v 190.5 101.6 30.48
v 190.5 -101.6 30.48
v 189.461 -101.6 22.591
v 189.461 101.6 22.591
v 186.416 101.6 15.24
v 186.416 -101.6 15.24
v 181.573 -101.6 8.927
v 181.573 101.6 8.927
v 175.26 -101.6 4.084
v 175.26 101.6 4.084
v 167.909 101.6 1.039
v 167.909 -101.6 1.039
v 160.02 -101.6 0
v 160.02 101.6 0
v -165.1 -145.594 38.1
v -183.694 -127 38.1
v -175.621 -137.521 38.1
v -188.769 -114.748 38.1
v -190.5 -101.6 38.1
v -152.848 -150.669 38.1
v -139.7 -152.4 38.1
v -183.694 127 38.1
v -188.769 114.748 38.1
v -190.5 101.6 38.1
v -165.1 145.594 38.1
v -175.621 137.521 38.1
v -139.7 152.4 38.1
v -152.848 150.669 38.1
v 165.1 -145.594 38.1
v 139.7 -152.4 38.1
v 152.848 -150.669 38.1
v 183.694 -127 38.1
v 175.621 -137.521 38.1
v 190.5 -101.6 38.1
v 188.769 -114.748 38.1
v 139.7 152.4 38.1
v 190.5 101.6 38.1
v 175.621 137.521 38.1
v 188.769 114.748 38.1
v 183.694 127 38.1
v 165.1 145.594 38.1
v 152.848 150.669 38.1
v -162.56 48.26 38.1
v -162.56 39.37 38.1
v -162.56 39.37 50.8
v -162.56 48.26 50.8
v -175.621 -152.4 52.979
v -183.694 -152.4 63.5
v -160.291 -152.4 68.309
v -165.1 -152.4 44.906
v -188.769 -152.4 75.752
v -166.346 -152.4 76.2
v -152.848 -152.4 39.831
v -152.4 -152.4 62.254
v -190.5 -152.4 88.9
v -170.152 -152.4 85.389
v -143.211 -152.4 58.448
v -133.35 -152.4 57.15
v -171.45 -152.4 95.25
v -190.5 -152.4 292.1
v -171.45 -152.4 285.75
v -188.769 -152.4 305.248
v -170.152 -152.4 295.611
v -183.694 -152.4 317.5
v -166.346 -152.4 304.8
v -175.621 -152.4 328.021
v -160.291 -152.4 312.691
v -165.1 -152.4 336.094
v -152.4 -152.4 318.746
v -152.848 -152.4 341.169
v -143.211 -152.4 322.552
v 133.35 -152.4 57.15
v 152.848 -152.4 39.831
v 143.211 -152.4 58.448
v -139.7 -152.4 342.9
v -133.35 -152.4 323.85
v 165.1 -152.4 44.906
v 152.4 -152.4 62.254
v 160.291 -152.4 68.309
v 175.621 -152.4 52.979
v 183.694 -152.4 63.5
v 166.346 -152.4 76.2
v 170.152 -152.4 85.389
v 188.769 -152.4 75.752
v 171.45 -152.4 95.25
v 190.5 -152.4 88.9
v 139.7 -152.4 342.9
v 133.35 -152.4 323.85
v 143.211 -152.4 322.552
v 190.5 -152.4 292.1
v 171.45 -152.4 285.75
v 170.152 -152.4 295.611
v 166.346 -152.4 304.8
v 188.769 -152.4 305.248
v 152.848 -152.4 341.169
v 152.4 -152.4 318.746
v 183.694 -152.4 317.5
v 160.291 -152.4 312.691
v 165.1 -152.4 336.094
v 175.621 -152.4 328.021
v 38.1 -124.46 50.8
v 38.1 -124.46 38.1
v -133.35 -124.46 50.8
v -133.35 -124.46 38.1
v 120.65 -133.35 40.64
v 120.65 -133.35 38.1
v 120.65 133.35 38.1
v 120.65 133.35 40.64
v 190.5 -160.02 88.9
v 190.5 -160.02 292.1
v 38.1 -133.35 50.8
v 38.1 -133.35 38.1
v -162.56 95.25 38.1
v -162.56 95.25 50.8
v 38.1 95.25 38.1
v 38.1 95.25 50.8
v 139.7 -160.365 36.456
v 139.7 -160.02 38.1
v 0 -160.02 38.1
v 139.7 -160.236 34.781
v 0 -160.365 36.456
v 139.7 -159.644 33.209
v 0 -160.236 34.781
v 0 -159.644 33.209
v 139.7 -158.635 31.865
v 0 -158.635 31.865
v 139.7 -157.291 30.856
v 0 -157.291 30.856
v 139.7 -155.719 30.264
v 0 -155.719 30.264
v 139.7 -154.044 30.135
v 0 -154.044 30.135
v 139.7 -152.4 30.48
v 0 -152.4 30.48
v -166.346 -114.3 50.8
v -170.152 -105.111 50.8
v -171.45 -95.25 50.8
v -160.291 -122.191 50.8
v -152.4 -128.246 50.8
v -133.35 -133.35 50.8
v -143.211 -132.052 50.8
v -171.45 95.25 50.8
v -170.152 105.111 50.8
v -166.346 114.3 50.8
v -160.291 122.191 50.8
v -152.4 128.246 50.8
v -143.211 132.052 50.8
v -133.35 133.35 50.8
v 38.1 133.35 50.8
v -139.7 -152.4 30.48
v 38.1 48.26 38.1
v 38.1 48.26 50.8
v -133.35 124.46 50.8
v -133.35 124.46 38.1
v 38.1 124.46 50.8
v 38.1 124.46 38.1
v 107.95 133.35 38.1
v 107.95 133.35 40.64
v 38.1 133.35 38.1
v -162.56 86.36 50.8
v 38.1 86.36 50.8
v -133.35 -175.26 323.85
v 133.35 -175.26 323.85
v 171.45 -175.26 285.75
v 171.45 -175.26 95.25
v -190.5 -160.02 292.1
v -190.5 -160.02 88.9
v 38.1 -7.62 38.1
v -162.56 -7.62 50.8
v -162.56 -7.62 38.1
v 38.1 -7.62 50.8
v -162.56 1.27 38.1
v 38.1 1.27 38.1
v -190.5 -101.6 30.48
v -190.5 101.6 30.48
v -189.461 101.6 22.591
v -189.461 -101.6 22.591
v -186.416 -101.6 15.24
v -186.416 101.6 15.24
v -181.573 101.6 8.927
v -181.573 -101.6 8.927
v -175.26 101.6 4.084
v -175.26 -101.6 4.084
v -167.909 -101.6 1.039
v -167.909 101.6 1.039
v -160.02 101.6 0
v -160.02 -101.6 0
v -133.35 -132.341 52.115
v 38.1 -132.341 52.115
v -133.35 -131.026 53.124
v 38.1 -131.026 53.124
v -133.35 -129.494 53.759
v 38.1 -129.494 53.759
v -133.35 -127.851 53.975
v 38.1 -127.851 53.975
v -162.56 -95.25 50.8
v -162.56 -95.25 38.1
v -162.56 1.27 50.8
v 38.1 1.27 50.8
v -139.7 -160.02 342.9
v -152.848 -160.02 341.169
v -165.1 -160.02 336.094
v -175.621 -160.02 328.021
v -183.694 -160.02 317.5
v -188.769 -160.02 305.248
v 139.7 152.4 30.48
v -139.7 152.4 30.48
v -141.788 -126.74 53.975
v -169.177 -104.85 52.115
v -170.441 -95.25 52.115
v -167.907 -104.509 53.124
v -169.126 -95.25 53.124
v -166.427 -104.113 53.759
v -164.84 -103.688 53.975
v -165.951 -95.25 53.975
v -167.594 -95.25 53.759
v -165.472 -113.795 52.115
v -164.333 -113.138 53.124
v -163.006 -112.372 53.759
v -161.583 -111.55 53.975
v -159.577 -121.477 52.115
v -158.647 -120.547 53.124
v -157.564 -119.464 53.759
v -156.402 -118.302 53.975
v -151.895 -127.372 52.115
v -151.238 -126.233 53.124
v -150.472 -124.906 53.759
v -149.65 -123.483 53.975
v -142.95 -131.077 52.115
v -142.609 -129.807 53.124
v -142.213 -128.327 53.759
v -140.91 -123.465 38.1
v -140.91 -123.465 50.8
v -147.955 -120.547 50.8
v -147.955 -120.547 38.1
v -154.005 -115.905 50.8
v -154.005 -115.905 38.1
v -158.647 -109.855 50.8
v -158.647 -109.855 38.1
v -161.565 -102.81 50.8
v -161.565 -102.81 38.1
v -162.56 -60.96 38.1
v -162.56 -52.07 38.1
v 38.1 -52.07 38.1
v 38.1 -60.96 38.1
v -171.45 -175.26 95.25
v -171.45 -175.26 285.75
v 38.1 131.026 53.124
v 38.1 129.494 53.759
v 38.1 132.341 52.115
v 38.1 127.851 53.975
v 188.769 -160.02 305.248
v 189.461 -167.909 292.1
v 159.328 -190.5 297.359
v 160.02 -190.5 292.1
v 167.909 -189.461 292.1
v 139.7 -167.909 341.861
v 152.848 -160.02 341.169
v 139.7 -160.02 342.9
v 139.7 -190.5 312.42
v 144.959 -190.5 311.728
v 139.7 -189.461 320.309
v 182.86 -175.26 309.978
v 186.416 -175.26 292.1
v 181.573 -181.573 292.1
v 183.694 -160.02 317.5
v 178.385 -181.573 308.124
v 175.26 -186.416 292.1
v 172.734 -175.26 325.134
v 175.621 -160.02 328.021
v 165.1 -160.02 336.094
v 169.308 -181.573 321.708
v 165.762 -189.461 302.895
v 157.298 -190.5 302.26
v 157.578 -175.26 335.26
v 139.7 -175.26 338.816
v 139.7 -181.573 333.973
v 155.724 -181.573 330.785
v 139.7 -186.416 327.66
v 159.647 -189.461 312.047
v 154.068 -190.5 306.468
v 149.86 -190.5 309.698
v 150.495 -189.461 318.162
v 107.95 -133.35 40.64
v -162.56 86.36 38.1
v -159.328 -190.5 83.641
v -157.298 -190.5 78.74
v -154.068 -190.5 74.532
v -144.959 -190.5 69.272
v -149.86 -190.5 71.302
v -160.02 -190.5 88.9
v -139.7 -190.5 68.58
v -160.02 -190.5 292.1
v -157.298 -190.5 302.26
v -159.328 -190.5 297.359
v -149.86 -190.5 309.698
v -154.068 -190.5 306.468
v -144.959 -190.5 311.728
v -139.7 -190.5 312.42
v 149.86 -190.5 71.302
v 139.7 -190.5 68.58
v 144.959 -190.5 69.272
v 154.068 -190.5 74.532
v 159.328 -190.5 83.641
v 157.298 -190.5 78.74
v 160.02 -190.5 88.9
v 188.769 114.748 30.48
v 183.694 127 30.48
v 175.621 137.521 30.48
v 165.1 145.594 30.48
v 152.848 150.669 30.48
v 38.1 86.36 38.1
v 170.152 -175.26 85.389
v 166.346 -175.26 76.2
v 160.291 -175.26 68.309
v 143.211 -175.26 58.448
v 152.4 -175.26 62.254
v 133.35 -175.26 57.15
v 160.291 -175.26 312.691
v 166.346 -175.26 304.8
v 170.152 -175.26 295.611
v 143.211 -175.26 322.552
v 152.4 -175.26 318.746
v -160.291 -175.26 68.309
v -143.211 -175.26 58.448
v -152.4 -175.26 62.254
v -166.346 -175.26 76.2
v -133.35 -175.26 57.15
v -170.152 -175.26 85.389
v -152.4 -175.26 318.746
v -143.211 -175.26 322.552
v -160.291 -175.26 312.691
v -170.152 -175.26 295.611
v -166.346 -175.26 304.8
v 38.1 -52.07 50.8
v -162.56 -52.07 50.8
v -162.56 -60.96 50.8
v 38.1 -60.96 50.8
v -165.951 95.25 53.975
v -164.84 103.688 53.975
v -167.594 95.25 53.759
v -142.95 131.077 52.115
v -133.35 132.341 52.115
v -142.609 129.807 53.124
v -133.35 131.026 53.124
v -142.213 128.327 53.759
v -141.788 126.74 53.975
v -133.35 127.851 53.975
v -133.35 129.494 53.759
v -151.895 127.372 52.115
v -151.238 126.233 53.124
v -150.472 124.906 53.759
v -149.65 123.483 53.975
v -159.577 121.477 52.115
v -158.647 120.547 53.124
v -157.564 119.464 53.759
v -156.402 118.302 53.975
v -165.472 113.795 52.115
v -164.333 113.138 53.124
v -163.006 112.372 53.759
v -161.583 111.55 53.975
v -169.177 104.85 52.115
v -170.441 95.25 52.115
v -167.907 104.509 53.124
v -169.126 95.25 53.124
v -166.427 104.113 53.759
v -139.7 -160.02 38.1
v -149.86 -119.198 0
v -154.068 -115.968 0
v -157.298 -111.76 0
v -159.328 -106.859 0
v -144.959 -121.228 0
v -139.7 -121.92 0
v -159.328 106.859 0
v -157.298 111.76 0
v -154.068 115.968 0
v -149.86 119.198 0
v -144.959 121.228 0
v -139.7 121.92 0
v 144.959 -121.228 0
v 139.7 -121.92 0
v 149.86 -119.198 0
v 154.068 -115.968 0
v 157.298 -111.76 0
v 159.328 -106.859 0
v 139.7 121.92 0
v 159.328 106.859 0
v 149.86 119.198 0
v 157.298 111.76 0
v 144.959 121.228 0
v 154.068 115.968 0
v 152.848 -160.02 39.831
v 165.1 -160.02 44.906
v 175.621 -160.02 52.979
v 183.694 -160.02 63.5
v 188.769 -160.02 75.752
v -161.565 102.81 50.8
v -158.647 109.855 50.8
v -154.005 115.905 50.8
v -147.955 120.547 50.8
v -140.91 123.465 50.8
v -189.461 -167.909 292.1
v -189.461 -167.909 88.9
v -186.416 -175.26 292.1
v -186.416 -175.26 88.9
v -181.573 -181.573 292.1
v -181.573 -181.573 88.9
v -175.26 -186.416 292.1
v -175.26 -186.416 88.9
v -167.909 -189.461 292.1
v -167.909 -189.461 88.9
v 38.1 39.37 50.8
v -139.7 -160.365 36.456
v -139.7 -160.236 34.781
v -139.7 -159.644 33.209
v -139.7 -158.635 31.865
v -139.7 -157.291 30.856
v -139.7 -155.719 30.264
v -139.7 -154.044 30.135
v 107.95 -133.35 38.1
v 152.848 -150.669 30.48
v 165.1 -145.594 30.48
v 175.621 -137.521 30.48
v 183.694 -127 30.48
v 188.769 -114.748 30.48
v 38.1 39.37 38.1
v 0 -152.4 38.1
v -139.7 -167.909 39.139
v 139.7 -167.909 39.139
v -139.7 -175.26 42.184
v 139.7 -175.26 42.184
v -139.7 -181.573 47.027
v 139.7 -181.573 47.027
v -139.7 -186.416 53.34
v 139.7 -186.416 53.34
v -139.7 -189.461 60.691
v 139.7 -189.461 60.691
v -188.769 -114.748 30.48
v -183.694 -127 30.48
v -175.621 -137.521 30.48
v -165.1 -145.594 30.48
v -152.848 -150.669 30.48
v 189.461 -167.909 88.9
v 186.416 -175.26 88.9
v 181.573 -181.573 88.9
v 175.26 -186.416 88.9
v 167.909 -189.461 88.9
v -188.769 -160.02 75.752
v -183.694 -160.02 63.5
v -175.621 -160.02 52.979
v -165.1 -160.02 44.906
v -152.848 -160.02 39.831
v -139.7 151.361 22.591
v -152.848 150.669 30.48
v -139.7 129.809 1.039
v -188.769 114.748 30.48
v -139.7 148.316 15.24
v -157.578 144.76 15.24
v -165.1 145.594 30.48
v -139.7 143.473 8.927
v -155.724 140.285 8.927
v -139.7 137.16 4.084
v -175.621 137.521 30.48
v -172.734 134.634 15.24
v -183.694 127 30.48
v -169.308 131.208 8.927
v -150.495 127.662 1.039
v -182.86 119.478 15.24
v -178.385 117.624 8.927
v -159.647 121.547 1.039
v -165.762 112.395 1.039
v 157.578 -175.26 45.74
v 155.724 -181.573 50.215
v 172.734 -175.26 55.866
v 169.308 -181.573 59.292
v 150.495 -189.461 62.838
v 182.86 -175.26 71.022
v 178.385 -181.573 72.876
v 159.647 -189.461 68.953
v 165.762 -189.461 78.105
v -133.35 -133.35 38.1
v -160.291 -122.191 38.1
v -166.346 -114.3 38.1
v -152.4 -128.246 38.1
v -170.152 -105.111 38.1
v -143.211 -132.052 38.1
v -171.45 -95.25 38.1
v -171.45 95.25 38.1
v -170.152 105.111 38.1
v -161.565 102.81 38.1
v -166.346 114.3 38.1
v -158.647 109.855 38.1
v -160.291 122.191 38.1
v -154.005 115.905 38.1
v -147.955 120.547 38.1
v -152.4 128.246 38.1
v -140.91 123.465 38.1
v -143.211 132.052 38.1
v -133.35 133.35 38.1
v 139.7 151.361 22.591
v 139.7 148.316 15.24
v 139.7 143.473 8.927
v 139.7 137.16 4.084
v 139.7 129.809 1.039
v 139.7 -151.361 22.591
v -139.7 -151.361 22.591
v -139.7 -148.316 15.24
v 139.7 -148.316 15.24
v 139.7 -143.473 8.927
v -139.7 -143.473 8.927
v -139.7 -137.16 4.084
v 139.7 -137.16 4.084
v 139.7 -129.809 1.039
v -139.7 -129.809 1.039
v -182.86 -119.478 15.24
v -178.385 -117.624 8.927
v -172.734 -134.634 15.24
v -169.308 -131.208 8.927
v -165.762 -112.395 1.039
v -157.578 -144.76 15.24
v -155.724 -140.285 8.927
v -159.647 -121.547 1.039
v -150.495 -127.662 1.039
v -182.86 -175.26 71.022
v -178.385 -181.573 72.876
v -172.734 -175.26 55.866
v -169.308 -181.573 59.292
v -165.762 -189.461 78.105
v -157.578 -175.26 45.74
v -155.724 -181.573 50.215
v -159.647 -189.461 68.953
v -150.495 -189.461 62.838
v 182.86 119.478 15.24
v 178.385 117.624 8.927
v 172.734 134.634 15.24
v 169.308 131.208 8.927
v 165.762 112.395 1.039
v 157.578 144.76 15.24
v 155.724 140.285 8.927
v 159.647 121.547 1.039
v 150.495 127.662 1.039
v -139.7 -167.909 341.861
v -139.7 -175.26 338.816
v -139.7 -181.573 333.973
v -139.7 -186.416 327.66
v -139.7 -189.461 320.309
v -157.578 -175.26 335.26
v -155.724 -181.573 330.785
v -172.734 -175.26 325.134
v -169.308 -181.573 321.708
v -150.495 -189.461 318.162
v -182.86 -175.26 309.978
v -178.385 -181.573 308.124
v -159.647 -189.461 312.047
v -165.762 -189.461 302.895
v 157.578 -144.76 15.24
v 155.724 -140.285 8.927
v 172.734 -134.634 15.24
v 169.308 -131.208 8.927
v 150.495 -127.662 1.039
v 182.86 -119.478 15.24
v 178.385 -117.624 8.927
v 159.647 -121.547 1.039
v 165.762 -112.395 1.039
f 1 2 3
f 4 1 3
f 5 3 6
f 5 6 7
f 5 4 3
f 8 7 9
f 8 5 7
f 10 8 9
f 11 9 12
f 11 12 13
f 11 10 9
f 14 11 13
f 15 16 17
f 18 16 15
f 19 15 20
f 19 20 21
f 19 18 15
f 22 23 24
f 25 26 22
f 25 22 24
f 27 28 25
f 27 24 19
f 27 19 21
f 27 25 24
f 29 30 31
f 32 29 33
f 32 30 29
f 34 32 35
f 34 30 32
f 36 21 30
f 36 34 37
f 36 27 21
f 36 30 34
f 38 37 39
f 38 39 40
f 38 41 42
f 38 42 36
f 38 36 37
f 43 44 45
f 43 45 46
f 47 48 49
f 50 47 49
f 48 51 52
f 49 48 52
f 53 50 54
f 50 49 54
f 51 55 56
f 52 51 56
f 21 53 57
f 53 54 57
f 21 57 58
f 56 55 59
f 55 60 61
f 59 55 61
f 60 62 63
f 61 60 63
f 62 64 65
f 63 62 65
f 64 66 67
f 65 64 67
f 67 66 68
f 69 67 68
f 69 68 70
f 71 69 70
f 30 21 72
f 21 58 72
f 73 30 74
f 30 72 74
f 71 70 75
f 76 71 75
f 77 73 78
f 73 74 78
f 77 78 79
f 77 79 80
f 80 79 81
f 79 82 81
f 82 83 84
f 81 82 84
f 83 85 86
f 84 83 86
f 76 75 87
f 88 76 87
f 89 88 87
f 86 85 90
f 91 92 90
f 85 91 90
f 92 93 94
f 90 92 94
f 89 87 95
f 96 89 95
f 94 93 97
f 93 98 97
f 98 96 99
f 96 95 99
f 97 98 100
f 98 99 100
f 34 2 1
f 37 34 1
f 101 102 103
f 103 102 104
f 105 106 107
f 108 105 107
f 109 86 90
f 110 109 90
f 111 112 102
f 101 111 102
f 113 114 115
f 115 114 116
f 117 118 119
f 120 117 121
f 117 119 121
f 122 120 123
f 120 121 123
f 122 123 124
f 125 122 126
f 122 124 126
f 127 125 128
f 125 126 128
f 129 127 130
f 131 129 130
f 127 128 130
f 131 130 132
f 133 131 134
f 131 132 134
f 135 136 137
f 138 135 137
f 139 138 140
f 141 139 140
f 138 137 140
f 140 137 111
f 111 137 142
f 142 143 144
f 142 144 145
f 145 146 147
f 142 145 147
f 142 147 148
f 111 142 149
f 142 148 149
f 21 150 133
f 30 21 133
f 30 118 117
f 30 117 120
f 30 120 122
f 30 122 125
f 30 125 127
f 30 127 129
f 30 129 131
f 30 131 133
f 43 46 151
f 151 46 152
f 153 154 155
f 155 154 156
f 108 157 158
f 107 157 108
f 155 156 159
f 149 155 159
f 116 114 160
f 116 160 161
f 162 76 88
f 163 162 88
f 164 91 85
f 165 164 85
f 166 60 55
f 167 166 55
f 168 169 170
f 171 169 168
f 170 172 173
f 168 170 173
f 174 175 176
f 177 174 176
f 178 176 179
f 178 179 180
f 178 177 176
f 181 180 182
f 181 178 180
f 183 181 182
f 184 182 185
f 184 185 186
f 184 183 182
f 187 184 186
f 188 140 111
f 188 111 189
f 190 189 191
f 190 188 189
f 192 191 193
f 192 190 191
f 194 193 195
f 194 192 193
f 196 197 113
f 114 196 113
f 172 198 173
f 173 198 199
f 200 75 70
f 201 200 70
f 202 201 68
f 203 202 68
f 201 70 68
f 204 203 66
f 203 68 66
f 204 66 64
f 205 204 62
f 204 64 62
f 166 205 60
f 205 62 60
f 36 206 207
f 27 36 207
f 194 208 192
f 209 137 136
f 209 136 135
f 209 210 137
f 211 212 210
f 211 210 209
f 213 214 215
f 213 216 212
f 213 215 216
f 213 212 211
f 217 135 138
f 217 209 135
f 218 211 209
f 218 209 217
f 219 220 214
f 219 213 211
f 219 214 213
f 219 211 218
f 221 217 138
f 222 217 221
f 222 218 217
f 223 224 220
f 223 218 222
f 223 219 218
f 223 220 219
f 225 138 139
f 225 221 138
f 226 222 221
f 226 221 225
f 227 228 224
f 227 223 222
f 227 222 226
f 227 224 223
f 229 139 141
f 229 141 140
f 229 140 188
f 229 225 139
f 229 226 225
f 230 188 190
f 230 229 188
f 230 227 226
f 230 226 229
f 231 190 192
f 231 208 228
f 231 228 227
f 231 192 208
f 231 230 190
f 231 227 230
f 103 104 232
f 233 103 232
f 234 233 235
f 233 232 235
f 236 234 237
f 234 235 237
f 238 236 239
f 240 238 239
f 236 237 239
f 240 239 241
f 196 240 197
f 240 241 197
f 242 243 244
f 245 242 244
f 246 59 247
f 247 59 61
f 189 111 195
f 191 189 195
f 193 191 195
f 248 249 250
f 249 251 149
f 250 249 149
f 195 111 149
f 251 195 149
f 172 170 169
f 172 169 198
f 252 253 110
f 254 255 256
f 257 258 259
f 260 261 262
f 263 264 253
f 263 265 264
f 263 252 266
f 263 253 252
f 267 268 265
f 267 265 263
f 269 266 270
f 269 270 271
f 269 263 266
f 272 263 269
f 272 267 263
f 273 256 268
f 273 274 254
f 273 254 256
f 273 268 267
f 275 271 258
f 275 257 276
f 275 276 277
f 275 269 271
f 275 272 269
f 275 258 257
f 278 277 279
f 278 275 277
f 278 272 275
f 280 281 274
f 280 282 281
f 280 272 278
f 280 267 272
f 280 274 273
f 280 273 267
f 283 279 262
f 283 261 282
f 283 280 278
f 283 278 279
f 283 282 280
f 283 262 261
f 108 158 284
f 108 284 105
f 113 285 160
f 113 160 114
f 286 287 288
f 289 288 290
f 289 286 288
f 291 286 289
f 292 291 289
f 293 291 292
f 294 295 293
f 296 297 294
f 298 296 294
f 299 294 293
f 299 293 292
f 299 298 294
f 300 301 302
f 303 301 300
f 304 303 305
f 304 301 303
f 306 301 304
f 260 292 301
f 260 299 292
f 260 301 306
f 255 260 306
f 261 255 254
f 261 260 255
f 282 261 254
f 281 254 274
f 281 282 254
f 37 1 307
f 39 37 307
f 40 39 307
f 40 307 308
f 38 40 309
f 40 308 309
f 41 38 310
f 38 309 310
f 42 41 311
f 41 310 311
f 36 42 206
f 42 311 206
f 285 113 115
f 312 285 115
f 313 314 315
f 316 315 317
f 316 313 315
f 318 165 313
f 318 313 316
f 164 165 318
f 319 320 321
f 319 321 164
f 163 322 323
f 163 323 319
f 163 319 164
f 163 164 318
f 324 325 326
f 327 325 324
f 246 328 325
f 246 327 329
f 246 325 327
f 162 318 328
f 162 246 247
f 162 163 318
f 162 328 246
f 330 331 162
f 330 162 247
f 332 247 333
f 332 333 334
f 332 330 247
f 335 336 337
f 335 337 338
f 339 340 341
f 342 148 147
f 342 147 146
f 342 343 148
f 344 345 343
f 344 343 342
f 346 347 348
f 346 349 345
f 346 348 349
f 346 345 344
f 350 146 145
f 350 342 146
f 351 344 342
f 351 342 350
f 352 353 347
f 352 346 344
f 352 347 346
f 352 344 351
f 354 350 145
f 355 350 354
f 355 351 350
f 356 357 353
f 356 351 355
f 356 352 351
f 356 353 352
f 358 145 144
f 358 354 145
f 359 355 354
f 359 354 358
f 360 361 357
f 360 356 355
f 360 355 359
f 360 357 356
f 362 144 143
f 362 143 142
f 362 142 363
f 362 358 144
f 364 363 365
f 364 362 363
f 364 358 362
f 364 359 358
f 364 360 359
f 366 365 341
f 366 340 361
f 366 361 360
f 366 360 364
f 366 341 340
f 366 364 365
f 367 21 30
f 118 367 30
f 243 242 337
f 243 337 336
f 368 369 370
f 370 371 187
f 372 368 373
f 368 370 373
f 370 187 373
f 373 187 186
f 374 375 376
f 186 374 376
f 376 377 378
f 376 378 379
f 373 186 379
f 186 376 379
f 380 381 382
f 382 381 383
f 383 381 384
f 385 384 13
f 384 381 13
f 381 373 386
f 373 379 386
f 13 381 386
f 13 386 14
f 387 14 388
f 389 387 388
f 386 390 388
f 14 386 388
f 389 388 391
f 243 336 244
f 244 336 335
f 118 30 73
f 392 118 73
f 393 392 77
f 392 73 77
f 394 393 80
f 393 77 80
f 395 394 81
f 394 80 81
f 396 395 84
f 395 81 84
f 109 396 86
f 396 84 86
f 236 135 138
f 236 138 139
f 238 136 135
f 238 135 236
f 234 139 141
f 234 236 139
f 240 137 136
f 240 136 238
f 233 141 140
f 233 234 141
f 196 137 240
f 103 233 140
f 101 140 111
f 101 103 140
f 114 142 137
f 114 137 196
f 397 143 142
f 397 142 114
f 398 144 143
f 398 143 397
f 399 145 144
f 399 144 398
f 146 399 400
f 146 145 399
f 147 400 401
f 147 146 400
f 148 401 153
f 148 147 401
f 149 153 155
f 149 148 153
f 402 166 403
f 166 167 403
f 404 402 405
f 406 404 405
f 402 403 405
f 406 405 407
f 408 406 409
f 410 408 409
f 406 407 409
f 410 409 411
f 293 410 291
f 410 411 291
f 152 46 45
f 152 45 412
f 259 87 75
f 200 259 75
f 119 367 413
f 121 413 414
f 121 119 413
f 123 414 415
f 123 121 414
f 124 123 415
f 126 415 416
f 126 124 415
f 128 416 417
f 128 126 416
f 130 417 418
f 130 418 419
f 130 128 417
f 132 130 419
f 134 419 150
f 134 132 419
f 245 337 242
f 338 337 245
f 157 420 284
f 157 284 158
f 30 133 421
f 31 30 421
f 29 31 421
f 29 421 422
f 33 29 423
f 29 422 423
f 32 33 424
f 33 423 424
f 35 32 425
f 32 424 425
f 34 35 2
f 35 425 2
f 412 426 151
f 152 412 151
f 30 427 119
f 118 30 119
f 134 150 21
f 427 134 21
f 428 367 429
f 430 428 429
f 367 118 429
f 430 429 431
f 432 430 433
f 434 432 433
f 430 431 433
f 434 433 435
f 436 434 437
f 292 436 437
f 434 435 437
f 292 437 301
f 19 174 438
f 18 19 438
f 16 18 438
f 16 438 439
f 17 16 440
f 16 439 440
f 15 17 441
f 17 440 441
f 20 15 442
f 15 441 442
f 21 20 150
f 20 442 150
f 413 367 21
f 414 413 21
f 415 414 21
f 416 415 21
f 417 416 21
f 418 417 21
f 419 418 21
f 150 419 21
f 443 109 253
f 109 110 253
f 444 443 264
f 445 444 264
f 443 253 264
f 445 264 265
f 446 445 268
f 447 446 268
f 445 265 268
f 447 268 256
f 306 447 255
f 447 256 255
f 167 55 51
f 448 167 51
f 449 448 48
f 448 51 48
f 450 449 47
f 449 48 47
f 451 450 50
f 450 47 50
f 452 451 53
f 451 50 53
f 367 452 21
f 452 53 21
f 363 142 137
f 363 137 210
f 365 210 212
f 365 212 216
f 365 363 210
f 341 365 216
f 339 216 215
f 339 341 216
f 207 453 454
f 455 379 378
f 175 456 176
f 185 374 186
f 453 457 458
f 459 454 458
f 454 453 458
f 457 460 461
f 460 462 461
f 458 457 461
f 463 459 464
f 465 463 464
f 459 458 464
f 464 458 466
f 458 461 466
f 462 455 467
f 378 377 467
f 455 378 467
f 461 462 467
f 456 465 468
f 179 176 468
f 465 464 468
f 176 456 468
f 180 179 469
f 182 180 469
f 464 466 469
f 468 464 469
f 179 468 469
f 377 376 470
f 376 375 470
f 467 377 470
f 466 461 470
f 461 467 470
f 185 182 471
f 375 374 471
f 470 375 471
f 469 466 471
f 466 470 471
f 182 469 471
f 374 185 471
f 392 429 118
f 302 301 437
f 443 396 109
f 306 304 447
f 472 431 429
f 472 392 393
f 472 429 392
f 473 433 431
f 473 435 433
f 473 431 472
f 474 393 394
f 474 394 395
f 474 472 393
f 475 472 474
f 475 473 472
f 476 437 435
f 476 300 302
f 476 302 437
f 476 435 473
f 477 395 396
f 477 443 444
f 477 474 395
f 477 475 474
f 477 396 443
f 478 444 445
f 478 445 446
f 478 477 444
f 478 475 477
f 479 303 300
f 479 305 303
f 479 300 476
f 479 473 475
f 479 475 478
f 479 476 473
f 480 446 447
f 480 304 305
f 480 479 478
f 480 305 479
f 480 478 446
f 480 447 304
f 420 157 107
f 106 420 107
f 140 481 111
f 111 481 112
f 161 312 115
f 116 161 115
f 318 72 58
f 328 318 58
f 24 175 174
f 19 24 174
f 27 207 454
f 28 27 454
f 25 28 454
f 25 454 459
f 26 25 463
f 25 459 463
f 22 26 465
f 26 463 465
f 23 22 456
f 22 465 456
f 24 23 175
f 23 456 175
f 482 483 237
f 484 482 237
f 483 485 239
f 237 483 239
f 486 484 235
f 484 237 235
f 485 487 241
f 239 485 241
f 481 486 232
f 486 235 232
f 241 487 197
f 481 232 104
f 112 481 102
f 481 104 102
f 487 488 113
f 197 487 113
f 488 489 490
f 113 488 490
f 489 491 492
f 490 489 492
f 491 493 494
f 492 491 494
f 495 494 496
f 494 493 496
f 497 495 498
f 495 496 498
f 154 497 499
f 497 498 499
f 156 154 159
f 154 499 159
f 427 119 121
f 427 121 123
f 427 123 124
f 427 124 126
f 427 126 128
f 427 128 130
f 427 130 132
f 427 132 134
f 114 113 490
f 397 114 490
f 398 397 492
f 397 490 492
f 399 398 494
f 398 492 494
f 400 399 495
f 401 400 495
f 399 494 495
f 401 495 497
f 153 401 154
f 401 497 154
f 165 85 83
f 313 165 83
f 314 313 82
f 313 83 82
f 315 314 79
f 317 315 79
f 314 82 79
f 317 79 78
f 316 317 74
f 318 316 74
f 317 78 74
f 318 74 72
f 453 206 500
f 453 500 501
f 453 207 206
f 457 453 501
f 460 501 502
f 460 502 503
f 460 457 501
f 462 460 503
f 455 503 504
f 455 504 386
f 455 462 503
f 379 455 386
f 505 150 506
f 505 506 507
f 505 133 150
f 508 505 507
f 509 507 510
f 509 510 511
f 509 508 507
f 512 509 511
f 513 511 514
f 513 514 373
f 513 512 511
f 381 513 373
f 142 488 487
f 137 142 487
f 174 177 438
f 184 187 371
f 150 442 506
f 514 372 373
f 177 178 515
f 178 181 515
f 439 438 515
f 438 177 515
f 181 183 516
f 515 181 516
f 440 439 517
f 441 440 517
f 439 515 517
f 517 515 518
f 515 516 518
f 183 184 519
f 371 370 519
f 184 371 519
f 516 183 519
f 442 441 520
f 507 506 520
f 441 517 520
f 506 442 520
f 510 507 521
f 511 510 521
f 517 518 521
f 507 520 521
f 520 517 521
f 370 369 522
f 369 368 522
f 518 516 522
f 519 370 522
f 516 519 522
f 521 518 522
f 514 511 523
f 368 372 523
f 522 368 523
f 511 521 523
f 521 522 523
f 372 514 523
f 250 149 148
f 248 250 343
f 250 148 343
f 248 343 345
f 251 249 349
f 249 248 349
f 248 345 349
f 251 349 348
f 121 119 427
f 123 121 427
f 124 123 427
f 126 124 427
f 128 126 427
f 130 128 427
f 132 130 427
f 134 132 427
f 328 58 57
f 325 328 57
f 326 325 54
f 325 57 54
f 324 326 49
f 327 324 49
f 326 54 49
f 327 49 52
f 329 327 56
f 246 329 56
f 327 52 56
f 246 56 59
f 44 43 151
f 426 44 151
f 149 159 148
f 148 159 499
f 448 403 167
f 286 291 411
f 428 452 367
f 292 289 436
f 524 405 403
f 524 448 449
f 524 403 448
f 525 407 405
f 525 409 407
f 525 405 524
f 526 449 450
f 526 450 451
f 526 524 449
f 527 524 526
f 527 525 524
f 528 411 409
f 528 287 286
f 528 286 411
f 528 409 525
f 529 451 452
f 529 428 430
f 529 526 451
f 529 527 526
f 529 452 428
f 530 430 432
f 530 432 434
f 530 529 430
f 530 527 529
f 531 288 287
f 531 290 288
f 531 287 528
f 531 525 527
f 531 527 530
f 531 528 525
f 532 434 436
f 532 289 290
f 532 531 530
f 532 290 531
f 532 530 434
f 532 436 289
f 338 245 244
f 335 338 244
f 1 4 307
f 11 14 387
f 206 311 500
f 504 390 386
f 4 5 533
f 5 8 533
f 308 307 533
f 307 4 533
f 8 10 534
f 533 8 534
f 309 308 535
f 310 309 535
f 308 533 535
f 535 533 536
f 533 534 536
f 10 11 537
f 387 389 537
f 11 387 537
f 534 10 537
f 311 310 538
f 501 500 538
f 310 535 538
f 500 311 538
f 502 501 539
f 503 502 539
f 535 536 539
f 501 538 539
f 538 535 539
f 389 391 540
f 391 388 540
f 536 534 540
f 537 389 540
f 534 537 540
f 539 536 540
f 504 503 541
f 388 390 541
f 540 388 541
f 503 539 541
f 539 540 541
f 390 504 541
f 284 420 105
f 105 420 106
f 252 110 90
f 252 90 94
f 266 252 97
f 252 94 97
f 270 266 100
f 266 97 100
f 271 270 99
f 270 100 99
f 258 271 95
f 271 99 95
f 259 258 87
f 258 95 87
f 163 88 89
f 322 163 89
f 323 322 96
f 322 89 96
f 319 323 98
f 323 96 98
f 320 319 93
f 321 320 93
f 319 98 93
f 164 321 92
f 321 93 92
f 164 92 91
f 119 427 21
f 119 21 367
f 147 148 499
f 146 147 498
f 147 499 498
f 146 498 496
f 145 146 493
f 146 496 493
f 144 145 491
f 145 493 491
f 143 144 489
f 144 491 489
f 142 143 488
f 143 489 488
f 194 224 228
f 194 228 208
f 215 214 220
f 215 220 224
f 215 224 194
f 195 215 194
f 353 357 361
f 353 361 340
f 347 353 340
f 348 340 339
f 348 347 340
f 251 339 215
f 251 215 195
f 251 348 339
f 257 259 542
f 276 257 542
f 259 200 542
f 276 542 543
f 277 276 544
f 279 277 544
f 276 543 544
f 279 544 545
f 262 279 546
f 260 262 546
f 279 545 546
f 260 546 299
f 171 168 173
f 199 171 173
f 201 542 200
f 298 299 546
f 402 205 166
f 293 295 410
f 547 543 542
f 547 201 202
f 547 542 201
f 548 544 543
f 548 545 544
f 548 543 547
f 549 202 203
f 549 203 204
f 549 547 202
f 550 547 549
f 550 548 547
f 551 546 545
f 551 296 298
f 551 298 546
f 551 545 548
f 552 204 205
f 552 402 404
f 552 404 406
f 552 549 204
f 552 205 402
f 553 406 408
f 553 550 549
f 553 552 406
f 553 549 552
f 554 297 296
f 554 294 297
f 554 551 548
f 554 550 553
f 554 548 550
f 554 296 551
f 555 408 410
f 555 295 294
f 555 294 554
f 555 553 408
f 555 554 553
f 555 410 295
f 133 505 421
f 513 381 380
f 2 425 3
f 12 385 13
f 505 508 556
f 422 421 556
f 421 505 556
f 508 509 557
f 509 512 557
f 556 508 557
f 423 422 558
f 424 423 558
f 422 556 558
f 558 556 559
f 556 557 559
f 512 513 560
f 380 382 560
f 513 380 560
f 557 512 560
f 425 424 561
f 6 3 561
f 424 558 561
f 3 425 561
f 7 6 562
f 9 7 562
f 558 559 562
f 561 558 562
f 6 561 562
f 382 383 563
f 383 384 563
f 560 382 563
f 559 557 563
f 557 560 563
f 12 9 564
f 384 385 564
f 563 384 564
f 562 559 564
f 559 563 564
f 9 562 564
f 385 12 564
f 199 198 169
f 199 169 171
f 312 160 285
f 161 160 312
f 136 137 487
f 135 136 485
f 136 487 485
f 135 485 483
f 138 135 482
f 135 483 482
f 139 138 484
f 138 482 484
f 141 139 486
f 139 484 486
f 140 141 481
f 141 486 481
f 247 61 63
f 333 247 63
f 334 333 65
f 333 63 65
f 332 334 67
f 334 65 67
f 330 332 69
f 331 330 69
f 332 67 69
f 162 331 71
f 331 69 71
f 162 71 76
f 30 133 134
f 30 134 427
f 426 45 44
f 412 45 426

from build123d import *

# Parameters (mm, degrees)
F1_DEPTH     = 38.1
F2_R         = 30.48
F4_DEPTH     = 38.1
F5_R         = 30.48
F7_DEPTH     = 139.7
F8_DEPTH     = 139.7
F10_DEPTH    = 22.86
F13_DEPTH    = 12.7
F14_W        = 200.66
F14_H        = 8.89
F15_DEPTH    = 12.7
F17_DEPTH    = 3.175
F18_T1_DEPTH = 190.5
F18_T3_DEPTH = 185.1981532851
F18_T6_ANGLE = 90
F18_T8_ANGLE = 90
F19_W        = 12.7
F19_H        = 266.7
F20_DEPTH    = 2.54


# Not quite as in the source:
# - a fillet or chamfer that OpenCascade refuses, or shapes differently, is made with other operations: its cross-section is extruded or revolved along the edge and cut away or added
# - a length typed as a fraction of an inch, garbled in the dataset ("3 / 203.2 mm" for 3/8 in), is restored


with BuildPart() as f1:
    # F0 (on Top) → F1 (new body)
    with BuildSketch(Plane.XY):
        with BuildLine():
            Line((-139.7, -152.4), (139.7, -152.4))
            ThreePointArc((139.7, -152.4), (175.6210244843, -137.5210244843), (190.5, -101.6))
            Line((190.5, -101.6), (190.5, 101.6))
            ThreePointArc((190.5, 101.6), (175.6210244843, 137.5210244843), (139.7, 152.4))
            Line((139.7, 152.4), (-139.7, 152.4))
            ThreePointArc((-139.7, 152.4), (-175.6210244843, 137.5210244843), (-190.5, 101.6))
            Line((-190.5, 101.6), (-190.5, -101.6))
            ThreePointArc((-190.5, -101.6), (-175.6210244843, -137.5210244843), (-139.7, -152.4))
        make_face()
    extrude(amount=F1_DEPTH)

    # F2
    f2_edges = [f1.edges().sort_by_distance(p)[0] for p in [
        (0, -152.4, 0),
    ]]
    fillet(f2_edges, radius=F2_R)


with BuildPart() as f4:
    # F3 (on face) → F4 (new body)
    with BuildSketch(Plane.XZ.offset(152.4)):
        with BuildLine():
            Line((139.7, 342.9), (-139.7, 342.9))
            ThreePointArc((-139.7, 342.9), (-175.6210244843, 328.0210244843), (-190.5, 292.1))
            Line((-190.5, 292.1), (-190.5, 88.9))
            ThreePointArc((-190.5, 88.9), (-175.6210244843, 52.9789755157), (-139.7, 38.1))
            Line((-139.7, 38.1), (139.7, 38.1))
            ThreePointArc((139.7, 38.1), (175.6210244843, 52.9789755157), (190.5, 88.9))
            Line((190.5, 88.9), (190.5, 292.1))
            ThreePointArc((190.5, 292.1), (175.6210244843, 328.0210244843), (139.7, 342.9))
        make_face()
    extrude(amount=F4_DEPTH)

    # F5
    f5_edges = [f4.edges().sort_by_distance(p)[0] for p in [
        (-190.5, -190.5, 190.5),
        (0, -190.5, 342.9),
        (-175.621024, -190.5, 328.021024),
        (-175.621024, -190.5, 52.978976),
        (0, -190.5, 38.1),
        (175.621024, -190.5, 52.978976),
        (190.5, -190.5, 190.5),
        (175.621024, -190.5, 328.021024),
    ]]
    fillet(f5_edges, radius=F5_R)

    # F9 (on face) → F10 (cut)
    with BuildSketch(Plane(origin=(0, -152.4, 0), x_dir=(-1, 0, 0), z_dir=(0, 1, 0))):
        with BuildLine():
            Line((-133.35, 57.15), (133.35, 57.15))
            ThreePointArc((133.35, 57.15), (160.2907683632, 68.3092316368), (171.45, 95.25))
            Line((171.45, 95.25), (171.45, 285.75))
            ThreePointArc((171.45, 285.75), (160.2907683632, 312.6907683632), (133.35, 323.85))
            Line((133.35, 323.85), (-133.35, 323.85))
            ThreePointArc((-133.35, 323.85), (-160.2907683632, 312.6907683632), (-171.45, 285.75))
            Line((-171.45, 285.75), (-171.45, 95.25))
            ThreePointArc((-171.45, 95.25), (-160.2907683632, 68.3092316368), (-133.35, 57.15))
        make_face()
    extrude(amount=-F10_DEPTH, mode=Mode.SUBTRACT)


with BuildPart() as f7:
    # F6 (on Right) → F7 (new body)
    with BuildSketch(Plane.YZ):
        with BuildLine():
            Line((-152.4, 38.1), (-160.02, 38.1))
            ThreePointArc((-160.02, 38.1), (-158.6353242061, 31.8646757939), (-152.4, 30.48))
            Line((-152.4, 30.48), (-152.4, 38.1))
        make_face()
    extrude(amount=F7_DEPTH)


with BuildPart() as f8:
    # F8 (new): a face of the model
    f8_faces = [f7.part.faces().sort_by_distance(p)[0] for p in [
        (0, -156.0235310769, 34.4764689231),
    ]]
    extrude(f8_faces, amount=F8_DEPTH)


with BuildPart() as f13:
    # F12 (on face) → F13 (new body)
    with BuildSketch(Plane.XY.offset(38.1)):
        with BuildLine():
            Line((38.1, 133.35), (-133.35, 133.35))
            ThreePointArc((-133.35, 133.35), (-160.2907683632, 122.1907683632), (-171.45, 95.25))
            Line((-171.45, 95.25), (-171.45, -95.25))
            ThreePointArc((-171.45, -95.25), (-160.2907683632, -122.1907683632), (-133.35, -133.35))
            Line((-133.35, -133.35), (38.1, -133.35))
            Line((38.1, -133.35), (38.1, -124.46))
            Line((38.1, -124.46), (-133.35, -124.46))
            ThreePointArc((-133.35, -124.46), (-154.0045890785, -115.9045890785), (-162.56, -95.25))
            Line((-162.56, -95.25), (-162.56, 95.25))
            ThreePointArc((-162.56, 95.25), (-154.0045890785, 115.9045890785), (-133.35, 124.46))
            Line((-133.35, 124.46), (38.1, 124.46))
            Line((38.1, 124.46), (38.1, 133.35))
        make_face()
    extrude(amount=F13_DEPTH)


with BuildPart() as f15:
    # F14 (on face) → F15 (new body)
    with BuildSketch(Plane.XY.offset(50.8)):
        with Locations((-62.23, 90.805)):
            Rectangle(F14_W, F14_H)
    extrude(amount=-F15_DEPTH)


with BuildPart() as f15b:
    # F14 (on face) → F15, piece 2 (new body)
    with BuildSketch(Plane.XY.offset(50.8)):
        with Locations((-62.23, 43.815)):
            Rectangle(F14_W, F14_H)
    extrude(amount=-F15_DEPTH)


with BuildPart() as f15c:
    # F14 (on face) → F15, piece 3 (new body)
    with BuildSketch(Plane.XY.offset(50.8)):
        with Locations((-62.23, -3.175)):
            Rectangle(F14_W, F14_H)
    extrude(amount=-F15_DEPTH)


with BuildPart() as f15d:
    # F14 (on face) → F15, piece 4 (new body)
    with BuildSketch(Plane.XY.offset(50.8)):
        with Locations((-62.23, -56.515)):
            Rectangle(F14_W, F14_H)
    extrude(amount=-F15_DEPTH)


with BuildPart() as f17:
    # F16 (on face) → F17 (new body)
    with BuildSketch(Plane.XY.offset(50.8)):
        with BuildLine():
            Line((38.1, -133.35), (38.1, 133.35))
            Line((38.1, 133.35), (-133.35, 133.35))
            ThreePointArc((-133.35, 133.35), (-160.2907683632, 122.1907683632), (-171.45, 95.25))
            Line((-171.45, 95.25), (-171.45, -95.25))
            ThreePointArc((-171.45, -95.25), (-160.2907683632, -122.1907683632), (-133.35, -133.35))
            Line((-133.35, -133.35), (38.1, -133.35))
        make_face()
    extrude(amount=F17_DEPTH)

    # F18: fillet of radius 6.35 on 1 edges, made by hand

    # F18_s2 → F18_t1 (cut)
    with BuildSketch(Plane.XZ.offset(-95.25)):
        with BuildLine():
            ThreePointArc((-171.45, 50.8), (-169.125738686, 53.124261314), (-165.950738686, 53.975))
            Line((-165.950738686, 53.975), (-171.45, 53.975))
            Line((-171.45, 53.975), (-171.45, 50.8))
        make_face()
    extrude(amount=F18_T1_DEPTH, mode=Mode.SUBTRACT)

    # F18_s4 → F18_t3 (cut)
    with BuildSketch(Plane.YZ.offset(-133.35)):
        with BuildLine():
            ThreePointArc((-133.35, 50.8), (-131.025738686, 53.124261314), (-127.850738686, 53.975))
            Line((-127.850738686, 53.975), (-133.35, 53.975))
            Line((-133.35, 53.975), (-133.35, 50.8))
        make_face()
        with BuildLine():
            ThreePointArc((133.35, 50.8), (131.025738686, 53.124261314), (127.850738686, 53.975))
            Line((127.850738686, 53.975), (133.35, 53.975))
            Line((133.35, 53.975), (133.35, 50.8))
        make_face()
    extrude(amount=F18_T3_DEPTH, mode=Mode.SUBTRACT)

    # F18_s5 → F18_t6 (revolve, cut)
    with BuildSketch(Plane.YZ.offset(-133.35)):
        with BuildLine():
            ThreePointArc((133.35, 50.8), (131.025738686, 53.124261314), (127.850738686, 53.975))
            Line((127.850738686, 53.975), (133.35, 53.975))
            Line((133.35, 53.975), (133.35, 50.8))
        make_face()
    revolve(axis=Axis((-133.35, 95.25, 53.975), (0, 0, 1)), revolution_arc=F18_T6_ANGLE, mode=Mode.SUBTRACT)

    # F18_s7 → F18_t8 (revolve, cut)
    with BuildSketch(Plane.XZ.offset(95.25)):
        with BuildLine():
            ThreePointArc((-171.45, 50.8), (-169.125738686, 53.124261314), (-165.950738686, 53.975))
            Line((-165.950738686, 53.975), (-171.45, 53.975))
            Line((-171.45, 53.975), (-171.45, 50.8))
        make_face()
    revolve(axis=Axis((-133.35, -95.25, 53.975), (0, 0, 1)), revolution_arc=F18_T8_ANGLE, mode=Mode.SUBTRACT)


with BuildPart() as f20:
    # F19 (on face) → F20 (new body)
    with BuildSketch(Plane.XY.offset(38.1)):
        with Locations((114.3, 0)):
            Rectangle(F19_W, F19_H)
    extrude(amount=F20_DEPTH)


solid = Compound([f1.part, f4.part, f7.part, f8.part, f13.part, f15.part, f15b.part, f15c.part, f15d.part, f17.part, f20.part])
